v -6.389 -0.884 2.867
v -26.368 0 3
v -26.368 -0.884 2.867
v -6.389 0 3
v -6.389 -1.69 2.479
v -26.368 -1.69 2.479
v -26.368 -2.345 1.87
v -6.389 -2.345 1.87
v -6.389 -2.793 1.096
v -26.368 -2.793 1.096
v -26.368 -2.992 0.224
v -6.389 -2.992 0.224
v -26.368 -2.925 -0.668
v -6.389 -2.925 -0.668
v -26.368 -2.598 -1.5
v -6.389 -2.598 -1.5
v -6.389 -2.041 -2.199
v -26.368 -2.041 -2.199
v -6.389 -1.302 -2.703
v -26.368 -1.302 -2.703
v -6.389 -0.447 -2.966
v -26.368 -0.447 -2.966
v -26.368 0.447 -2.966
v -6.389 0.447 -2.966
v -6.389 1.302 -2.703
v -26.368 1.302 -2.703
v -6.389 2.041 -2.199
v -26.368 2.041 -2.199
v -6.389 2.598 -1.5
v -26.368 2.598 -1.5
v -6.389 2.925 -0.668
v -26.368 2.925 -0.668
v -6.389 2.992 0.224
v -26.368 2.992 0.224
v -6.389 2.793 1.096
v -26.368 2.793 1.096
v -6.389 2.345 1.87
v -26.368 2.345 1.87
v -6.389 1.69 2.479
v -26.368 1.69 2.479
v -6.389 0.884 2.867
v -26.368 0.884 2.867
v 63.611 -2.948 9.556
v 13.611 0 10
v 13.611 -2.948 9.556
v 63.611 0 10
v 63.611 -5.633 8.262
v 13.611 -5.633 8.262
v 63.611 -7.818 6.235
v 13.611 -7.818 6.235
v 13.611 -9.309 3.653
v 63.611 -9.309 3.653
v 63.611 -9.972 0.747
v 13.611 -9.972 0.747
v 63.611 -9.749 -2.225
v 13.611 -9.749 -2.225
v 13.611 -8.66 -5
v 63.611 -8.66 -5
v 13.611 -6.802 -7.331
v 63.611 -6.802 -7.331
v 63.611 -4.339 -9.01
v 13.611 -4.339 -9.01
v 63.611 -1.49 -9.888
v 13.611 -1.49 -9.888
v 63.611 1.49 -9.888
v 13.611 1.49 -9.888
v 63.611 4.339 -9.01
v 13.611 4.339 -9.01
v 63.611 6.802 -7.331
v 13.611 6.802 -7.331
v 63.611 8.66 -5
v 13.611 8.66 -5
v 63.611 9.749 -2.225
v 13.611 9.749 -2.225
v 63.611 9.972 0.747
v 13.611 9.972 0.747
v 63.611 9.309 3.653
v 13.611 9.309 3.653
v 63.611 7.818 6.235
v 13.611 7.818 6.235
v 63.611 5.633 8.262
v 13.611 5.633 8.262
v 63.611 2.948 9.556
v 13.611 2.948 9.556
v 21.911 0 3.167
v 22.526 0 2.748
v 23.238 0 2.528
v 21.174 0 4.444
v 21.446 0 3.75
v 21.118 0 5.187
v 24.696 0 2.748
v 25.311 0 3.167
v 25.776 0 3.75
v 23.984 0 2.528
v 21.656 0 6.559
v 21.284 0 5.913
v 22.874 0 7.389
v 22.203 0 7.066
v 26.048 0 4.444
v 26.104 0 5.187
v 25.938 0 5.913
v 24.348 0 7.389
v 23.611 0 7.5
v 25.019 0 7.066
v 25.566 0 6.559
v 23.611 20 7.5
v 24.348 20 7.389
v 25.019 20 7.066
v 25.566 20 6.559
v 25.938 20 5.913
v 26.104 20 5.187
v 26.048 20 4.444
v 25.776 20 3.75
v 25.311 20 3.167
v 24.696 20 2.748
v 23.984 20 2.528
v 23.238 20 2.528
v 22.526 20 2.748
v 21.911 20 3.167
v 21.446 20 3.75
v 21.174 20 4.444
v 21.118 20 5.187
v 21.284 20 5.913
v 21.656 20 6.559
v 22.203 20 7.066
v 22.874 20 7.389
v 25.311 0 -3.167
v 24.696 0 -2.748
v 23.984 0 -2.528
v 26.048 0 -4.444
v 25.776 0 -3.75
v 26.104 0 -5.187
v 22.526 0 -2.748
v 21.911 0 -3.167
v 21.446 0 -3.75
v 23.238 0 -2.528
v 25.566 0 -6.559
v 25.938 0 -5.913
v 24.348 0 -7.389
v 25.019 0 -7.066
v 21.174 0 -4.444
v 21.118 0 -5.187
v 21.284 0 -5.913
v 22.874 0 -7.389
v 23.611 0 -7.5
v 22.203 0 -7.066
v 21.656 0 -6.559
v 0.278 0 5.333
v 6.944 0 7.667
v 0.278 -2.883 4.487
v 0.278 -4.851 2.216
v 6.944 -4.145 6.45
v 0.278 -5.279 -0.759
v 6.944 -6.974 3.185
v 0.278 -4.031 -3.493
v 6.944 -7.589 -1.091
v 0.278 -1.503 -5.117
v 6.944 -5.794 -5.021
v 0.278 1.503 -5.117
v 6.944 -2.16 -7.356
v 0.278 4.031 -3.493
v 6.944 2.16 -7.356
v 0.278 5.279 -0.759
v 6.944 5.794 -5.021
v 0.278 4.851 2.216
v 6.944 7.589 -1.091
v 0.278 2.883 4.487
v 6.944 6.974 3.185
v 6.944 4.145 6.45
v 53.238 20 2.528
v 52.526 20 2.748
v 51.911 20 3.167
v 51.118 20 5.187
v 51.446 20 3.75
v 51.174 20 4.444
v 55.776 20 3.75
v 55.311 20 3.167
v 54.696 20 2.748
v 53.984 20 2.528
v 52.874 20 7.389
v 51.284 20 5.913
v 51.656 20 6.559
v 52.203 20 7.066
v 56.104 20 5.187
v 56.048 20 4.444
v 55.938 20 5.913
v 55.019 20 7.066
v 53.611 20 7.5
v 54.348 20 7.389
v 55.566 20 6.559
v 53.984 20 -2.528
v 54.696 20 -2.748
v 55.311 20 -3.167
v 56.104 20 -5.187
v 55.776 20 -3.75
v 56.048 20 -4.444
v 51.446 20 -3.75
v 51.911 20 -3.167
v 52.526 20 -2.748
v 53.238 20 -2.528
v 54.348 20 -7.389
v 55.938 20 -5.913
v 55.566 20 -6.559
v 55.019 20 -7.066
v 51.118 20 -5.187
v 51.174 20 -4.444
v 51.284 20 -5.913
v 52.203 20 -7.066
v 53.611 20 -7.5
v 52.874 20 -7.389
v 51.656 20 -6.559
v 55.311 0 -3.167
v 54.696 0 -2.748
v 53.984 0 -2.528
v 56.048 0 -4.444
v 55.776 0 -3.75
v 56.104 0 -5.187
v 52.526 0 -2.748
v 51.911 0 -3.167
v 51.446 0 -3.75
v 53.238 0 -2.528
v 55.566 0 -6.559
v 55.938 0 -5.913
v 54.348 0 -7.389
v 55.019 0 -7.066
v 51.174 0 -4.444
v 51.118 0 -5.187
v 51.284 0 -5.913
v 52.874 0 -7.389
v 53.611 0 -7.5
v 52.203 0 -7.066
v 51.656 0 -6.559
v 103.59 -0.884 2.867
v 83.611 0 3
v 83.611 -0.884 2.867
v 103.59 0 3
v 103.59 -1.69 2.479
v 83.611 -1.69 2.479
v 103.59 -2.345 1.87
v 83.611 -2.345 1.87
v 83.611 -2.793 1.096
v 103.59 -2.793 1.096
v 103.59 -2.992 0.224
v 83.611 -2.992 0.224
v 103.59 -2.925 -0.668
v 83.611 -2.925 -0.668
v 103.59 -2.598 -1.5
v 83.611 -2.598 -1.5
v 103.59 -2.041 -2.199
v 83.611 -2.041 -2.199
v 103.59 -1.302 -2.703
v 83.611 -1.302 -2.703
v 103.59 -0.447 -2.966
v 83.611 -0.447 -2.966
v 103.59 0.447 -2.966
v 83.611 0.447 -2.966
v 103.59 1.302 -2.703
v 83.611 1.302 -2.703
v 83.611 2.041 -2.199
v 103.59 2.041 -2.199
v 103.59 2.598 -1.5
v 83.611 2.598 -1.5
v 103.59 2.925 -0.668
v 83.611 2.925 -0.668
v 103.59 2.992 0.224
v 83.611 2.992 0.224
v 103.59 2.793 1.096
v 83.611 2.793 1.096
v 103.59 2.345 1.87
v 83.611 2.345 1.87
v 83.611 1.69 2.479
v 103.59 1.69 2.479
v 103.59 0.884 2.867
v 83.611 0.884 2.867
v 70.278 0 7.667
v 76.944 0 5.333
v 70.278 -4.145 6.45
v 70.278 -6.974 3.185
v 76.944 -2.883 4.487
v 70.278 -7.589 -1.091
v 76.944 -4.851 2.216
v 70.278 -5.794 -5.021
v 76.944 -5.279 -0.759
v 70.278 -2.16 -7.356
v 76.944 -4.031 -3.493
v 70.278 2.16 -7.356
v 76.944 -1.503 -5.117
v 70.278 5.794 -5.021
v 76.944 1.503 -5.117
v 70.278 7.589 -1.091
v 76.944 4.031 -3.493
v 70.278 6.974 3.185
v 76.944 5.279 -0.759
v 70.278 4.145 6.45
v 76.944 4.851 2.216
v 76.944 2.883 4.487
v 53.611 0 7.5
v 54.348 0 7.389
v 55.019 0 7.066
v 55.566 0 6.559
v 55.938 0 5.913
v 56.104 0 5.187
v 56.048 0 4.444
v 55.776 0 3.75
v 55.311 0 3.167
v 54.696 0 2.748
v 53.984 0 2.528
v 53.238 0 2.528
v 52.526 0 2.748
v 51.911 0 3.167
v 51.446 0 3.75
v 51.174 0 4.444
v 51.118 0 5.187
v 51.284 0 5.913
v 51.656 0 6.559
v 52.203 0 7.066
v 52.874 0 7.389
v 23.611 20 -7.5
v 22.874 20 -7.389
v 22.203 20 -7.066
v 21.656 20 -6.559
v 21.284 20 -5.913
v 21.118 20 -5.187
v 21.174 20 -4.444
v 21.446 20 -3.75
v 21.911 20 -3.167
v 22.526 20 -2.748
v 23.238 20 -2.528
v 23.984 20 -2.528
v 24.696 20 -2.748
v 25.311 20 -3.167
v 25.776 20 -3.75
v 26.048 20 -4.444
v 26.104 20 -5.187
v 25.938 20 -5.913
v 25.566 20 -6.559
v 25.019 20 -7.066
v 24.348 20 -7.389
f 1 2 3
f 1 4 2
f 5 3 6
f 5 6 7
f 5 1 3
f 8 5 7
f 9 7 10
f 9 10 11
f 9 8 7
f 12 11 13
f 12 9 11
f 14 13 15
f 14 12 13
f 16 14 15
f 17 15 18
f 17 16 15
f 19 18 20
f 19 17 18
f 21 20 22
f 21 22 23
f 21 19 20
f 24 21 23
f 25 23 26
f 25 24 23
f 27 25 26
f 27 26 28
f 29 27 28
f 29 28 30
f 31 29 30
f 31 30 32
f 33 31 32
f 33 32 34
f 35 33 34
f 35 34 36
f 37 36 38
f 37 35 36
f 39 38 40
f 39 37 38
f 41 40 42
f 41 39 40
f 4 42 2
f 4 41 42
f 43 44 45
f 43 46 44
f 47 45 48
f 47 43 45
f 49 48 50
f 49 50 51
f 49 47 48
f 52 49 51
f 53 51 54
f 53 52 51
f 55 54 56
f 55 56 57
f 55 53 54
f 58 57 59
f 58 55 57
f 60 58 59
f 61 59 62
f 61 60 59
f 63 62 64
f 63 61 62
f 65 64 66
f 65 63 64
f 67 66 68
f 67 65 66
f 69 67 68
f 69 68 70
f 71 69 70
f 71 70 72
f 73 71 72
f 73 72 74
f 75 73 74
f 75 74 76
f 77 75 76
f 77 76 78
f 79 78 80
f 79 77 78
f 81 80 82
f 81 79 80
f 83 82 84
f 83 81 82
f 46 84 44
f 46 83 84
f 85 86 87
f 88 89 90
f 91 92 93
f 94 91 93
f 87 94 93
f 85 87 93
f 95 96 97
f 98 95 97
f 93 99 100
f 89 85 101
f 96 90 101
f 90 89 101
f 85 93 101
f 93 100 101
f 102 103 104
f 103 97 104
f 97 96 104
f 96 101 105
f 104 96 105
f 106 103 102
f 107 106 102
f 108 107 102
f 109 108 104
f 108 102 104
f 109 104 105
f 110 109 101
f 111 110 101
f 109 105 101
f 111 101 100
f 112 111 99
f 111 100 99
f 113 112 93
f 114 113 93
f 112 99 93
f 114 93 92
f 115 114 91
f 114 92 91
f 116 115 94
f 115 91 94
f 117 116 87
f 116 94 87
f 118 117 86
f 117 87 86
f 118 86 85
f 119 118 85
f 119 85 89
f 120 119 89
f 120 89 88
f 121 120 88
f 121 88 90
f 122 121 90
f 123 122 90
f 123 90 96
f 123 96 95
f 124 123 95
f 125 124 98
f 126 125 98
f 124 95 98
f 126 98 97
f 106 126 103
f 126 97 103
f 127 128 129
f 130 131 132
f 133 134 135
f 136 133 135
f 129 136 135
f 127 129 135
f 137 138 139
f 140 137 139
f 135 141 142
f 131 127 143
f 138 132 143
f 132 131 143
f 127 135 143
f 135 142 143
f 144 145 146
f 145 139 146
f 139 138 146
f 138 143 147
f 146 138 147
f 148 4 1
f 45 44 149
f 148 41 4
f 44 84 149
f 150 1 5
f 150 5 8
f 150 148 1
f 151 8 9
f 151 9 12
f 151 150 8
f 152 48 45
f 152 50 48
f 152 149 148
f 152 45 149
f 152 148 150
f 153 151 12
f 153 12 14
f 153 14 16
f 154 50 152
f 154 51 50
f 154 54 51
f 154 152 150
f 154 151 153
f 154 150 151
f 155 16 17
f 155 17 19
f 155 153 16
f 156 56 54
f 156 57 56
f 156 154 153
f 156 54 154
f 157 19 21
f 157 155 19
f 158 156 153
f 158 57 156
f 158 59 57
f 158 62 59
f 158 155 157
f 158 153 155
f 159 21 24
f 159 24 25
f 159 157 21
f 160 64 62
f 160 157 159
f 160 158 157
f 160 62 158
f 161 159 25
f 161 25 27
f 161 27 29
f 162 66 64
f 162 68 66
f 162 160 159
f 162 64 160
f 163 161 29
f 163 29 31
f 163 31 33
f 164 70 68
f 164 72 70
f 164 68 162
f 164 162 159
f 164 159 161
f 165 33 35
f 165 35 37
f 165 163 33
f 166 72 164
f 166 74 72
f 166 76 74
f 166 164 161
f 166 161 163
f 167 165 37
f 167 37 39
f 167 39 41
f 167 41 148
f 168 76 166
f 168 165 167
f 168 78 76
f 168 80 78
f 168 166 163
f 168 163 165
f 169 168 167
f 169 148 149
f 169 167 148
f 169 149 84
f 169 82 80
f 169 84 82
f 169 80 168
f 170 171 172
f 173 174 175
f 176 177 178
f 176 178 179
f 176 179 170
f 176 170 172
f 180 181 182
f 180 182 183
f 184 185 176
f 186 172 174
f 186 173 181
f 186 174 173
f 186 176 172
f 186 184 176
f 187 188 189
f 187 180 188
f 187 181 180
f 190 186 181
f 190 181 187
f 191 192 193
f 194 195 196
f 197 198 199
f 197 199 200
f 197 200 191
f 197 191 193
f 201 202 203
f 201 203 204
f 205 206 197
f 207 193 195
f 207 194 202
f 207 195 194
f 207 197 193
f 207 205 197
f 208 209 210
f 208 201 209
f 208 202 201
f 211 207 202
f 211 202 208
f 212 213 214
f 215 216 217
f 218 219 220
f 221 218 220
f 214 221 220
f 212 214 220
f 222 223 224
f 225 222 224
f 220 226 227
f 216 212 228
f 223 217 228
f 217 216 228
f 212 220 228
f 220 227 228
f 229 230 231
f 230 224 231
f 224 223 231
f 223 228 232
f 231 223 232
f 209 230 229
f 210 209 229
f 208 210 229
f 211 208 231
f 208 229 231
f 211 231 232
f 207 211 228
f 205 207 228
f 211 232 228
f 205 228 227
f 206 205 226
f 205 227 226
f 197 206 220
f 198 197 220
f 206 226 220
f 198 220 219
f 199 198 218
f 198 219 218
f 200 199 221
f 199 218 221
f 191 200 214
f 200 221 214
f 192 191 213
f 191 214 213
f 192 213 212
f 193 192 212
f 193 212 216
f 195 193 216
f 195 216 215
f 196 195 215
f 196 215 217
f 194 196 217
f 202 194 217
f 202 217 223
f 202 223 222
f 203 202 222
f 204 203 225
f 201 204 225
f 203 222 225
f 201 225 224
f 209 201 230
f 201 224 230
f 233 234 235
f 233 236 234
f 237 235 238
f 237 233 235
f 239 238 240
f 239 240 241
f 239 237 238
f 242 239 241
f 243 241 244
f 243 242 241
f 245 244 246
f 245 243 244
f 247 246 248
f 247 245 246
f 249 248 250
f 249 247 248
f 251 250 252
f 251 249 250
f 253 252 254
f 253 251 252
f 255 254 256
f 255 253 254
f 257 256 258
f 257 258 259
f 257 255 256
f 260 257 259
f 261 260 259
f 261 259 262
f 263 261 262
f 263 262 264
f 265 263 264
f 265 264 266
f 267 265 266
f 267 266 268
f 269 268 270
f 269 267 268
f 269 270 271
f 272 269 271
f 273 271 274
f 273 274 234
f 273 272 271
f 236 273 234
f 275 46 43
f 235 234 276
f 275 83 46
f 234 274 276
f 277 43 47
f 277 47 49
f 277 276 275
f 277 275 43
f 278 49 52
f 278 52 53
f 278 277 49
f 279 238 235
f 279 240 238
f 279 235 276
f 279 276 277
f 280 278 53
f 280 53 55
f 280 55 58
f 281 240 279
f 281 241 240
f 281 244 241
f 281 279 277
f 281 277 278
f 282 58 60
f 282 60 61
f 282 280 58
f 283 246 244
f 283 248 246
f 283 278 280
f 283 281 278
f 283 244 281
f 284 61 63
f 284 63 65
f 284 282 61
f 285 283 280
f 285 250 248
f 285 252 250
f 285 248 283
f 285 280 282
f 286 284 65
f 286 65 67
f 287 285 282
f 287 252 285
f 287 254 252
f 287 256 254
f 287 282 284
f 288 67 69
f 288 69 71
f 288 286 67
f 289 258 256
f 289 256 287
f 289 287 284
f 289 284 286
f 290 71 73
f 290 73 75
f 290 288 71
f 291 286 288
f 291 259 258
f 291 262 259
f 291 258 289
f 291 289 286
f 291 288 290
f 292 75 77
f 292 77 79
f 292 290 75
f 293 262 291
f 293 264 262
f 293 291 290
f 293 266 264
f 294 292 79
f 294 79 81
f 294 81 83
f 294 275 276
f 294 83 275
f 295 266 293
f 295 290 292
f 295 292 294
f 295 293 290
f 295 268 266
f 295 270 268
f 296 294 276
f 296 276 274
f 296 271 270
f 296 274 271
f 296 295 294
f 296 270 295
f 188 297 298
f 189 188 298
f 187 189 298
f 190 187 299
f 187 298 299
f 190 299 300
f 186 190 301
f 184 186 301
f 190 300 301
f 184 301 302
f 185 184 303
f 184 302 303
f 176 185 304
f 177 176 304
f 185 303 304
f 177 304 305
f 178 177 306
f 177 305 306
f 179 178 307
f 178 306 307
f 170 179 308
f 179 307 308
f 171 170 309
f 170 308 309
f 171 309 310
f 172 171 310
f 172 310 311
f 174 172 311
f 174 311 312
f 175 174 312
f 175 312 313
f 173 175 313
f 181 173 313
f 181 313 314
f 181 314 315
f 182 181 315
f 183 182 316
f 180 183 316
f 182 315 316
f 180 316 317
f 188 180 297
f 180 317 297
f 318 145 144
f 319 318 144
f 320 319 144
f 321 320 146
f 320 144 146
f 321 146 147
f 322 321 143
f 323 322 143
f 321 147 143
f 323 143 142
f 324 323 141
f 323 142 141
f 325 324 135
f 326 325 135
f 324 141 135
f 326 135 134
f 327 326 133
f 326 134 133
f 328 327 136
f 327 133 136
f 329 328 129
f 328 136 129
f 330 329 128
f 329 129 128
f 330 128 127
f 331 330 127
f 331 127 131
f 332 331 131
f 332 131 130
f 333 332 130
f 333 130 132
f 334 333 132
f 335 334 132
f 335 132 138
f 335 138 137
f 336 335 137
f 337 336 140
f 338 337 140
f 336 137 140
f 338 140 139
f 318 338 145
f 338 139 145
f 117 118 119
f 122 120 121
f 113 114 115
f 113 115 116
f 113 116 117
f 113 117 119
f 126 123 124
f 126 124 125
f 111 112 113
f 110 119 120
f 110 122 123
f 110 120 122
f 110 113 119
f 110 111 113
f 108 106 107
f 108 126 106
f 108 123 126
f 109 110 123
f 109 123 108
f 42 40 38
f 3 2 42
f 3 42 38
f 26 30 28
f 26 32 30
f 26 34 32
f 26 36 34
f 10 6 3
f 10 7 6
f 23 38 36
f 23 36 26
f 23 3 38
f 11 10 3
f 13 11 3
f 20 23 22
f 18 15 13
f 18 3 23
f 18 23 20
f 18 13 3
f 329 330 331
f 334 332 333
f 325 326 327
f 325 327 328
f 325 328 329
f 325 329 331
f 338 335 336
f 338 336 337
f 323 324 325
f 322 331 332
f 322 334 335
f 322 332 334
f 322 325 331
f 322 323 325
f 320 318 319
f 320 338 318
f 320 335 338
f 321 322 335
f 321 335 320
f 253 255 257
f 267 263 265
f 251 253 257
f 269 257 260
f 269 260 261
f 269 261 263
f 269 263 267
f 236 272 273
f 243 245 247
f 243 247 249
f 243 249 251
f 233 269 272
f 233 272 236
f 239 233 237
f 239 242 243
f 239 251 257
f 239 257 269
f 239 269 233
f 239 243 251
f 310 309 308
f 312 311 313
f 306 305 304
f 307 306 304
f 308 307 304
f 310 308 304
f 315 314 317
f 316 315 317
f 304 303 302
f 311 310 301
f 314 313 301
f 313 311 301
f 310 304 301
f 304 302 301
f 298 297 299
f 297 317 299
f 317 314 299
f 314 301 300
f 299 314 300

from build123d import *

# Parameters (mm, degrees)
ESQUISSE4_R          = 2.5
BOSS_EXTRU_2_DEPTH   = 20
BOSS_EXTRU_2_2_DEPTH = 20
BOSS_EXTRU_2_3_DEPTH = 20
BOSS_EXTRU_2_4_DEPTH = 20


with BuildPart() as part:
    # Esquisse3 → Révolution1 (revolve)
    with BuildSketch(Plane.XY, mode=Mode.PRIVATE) as r_volution1_sk:
        Polygon((-6.389000887, -3), (13.610999113, -10), (63.610999113, -10), (83.610999113, -3), (103.590246684, -3), (103.590246684, 0), (-26.368248458, 0), (-26.368248458, -3), align=None)
    revolve(r_volution1_sk.sketch.rotate(Axis((-30.076719088, 0, 0), (1, 0, 0)), 270), axis=Axis((-30.076719088, 0, 0), (1, 0, 0)))


with BuildPart() as body_2:
    # Esquisse4 → Boss.-Extru.2 (new body)
    with BuildSketch(Plane(origin=(0, 0, 0), x_dir=(1, 0, 0), z_dir=(0, 1, 0))):
        with Locations(Location((23.610999113, -5, 0), (0, 0, 270))):
            Circle(ESQUISSE4_R)
    extrude(amount=BOSS_EXTRU_2_DEPTH)


with BuildPart() as body_3:
    # Esquisse4 → Boss.-Extru.2 2 (new body)
    with BuildSketch(Plane(origin=(0, 0, 0), x_dir=(1, 0, 0), z_dir=(0, 1, 0))):
        with Locations(Location((53.610999113, -5, 0), (0, 0, 270))):
            Circle(ESQUISSE4_R)
    extrude(amount=BOSS_EXTRU_2_2_DEPTH)


with BuildPart() as body_4:
    # Esquisse4 → Boss.-Extru.2 3 (new body)
    with BuildSketch(Plane(origin=(0, 0, 0), x_dir=(1, 0, 0), z_dir=(0, 1, 0))):
        with Locations(Location((53.610999113, 5, 0), (0, 0, 90))):
            Circle(ESQUISSE4_R)
    extrude(amount=BOSS_EXTRU_2_3_DEPTH)


with BuildPart() as body_5:
    # Esquisse4 → Boss.-Extru.2 4 (new body)
    with BuildSketch(Plane(origin=(0, 0, 0), x_dir=(1, 0, 0), z_dir=(0, 1, 0))):
        with Locations(Location((23.610999113, 5, 0), (0, 0, 90))):
            Circle(ESQUISSE4_R)
    extrude(amount=BOSS_EXTRU_2_4_DEPTH)


solid = Compound([part.part, body_2.part, body_3.part, body_4.part, body_5.part])
